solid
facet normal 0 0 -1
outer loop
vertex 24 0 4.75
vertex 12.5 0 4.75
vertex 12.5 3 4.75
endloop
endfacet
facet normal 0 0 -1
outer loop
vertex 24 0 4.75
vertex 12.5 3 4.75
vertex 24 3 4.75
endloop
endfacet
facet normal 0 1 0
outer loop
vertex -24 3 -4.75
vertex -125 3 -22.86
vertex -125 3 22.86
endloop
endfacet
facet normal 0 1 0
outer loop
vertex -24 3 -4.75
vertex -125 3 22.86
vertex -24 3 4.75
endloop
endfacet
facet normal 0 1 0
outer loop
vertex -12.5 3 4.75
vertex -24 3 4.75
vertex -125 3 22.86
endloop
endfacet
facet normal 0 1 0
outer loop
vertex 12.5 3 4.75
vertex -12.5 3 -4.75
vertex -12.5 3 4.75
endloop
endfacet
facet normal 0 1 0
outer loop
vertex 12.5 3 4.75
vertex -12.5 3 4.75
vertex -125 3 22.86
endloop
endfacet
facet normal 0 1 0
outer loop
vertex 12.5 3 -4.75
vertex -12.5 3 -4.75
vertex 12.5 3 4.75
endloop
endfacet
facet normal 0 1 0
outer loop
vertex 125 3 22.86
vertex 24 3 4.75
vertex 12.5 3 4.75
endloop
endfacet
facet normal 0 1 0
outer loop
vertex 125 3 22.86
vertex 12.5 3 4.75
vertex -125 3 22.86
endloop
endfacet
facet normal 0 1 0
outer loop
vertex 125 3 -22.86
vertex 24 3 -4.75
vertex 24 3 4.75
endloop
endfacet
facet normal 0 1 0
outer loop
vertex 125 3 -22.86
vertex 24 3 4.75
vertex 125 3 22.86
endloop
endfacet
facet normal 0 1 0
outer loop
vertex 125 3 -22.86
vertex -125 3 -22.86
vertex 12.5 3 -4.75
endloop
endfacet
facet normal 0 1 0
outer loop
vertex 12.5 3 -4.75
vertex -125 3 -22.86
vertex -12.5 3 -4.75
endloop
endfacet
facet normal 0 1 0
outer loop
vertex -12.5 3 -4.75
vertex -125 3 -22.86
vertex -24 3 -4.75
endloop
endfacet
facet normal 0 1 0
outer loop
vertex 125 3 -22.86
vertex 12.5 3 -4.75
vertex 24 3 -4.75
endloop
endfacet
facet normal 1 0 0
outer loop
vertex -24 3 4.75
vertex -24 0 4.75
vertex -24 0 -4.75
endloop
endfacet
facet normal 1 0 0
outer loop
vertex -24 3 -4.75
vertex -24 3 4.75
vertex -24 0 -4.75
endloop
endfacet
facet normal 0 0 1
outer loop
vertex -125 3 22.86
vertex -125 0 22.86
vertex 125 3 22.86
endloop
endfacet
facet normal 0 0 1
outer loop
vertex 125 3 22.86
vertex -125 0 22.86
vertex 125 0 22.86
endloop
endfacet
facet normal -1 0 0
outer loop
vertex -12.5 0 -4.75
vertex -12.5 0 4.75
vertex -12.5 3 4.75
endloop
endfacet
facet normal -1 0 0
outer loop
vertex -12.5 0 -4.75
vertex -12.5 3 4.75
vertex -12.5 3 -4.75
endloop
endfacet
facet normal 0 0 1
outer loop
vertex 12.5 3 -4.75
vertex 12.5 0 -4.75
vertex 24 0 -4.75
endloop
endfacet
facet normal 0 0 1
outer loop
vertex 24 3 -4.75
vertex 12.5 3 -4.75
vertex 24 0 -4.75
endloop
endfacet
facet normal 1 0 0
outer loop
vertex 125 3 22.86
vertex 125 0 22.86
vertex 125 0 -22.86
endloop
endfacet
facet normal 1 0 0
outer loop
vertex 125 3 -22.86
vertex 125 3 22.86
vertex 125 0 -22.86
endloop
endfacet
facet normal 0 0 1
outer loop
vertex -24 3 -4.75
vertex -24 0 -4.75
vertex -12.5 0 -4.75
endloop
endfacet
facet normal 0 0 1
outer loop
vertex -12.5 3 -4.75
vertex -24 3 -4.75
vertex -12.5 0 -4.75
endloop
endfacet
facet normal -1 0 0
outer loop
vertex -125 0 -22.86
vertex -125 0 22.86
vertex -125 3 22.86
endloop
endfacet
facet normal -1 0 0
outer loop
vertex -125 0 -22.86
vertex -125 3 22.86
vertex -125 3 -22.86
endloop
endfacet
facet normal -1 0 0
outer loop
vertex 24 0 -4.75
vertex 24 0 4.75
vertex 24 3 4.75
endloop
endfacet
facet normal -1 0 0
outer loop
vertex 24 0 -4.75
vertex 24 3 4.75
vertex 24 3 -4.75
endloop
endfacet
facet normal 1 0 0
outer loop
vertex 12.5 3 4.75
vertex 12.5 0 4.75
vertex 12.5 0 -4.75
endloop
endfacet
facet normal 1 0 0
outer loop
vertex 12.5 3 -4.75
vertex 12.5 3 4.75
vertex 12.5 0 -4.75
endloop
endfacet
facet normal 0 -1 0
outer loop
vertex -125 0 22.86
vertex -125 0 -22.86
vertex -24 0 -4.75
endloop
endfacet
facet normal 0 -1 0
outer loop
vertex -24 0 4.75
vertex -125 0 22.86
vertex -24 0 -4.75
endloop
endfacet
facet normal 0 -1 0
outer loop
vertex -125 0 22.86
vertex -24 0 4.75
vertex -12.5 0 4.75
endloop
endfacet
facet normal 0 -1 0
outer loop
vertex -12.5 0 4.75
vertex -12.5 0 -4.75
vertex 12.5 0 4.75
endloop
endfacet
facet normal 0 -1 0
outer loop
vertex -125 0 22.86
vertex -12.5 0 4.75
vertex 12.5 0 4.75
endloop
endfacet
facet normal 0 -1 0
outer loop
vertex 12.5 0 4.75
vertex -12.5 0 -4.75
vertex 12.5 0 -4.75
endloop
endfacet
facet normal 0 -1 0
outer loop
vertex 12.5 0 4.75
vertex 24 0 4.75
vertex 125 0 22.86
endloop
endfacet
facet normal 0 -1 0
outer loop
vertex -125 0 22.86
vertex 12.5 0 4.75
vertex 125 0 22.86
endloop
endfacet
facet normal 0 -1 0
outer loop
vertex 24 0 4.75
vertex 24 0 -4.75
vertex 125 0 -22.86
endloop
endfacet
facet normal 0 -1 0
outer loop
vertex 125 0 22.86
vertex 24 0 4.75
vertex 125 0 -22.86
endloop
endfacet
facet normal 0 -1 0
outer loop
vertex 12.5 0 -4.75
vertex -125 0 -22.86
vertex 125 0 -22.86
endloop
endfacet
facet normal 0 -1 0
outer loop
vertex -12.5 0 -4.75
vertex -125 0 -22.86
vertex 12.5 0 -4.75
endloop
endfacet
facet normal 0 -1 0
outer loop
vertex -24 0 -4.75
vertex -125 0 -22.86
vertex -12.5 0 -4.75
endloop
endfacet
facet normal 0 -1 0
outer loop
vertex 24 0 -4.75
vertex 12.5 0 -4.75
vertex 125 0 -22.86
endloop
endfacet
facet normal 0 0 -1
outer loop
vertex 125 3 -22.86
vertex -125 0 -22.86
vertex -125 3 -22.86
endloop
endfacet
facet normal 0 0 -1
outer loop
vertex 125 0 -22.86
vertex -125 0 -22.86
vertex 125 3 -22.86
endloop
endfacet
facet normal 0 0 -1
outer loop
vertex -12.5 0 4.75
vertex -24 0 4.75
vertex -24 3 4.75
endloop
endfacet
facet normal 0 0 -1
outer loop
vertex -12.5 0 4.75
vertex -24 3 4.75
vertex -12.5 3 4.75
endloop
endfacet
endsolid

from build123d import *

# Parameters (mm, degrees)
SKETCH1_W               = 250
SKETCH1_H               = 45.72
BOSS_EXTRUDE1_DEPTH     = 3
CUT_EXTRUDE2_DEPTH      = 128.108534725
CUT_EXTRUDE2_DEPTH_BACK = 128.108534725
SKETCH2_W               = 11.500000066
SKETCH2_H               = 9.500000002
SKETCH2_H_2             = 9.50000005


with BuildPart() as part:
    # Sketch1 → Boss-Extrude1 (new body)
    with BuildSketch(Plane(origin=(0, 0, 0), x_dir=(1, 0, 0), z_dir=(0, 1, 0))):
        Rectangle(SKETCH1_W, SKETCH1_H)
    extrude(amount=BOSS_EXTRUDE1_DEPTH)

    # Sketch2 → Cut-Extrude2 (cut, two sides: drawn at the far end of the back side and taken through both)
    with BuildSketch(Plane(origin=(0, 0, 0), x_dir=(1, 0, 0), z_dir=(0, 1, 0)).offset(-CUT_EXTRUDE2_DEPTH_BACK)):
        with Locations((-18.250000033, 0)):
            Rectangle(SKETCH2_W, SKETCH2_H)
        with Locations((18.250000033, 0)):
            Rectangle(SKETCH2_W, SKETCH2_H_2)
    extrude(amount=CUT_EXTRUDE2_DEPTH + CUT_EXTRUDE2_DEPTH_BACK, mode=Mode.SUBTRACT)


solid = part.part
